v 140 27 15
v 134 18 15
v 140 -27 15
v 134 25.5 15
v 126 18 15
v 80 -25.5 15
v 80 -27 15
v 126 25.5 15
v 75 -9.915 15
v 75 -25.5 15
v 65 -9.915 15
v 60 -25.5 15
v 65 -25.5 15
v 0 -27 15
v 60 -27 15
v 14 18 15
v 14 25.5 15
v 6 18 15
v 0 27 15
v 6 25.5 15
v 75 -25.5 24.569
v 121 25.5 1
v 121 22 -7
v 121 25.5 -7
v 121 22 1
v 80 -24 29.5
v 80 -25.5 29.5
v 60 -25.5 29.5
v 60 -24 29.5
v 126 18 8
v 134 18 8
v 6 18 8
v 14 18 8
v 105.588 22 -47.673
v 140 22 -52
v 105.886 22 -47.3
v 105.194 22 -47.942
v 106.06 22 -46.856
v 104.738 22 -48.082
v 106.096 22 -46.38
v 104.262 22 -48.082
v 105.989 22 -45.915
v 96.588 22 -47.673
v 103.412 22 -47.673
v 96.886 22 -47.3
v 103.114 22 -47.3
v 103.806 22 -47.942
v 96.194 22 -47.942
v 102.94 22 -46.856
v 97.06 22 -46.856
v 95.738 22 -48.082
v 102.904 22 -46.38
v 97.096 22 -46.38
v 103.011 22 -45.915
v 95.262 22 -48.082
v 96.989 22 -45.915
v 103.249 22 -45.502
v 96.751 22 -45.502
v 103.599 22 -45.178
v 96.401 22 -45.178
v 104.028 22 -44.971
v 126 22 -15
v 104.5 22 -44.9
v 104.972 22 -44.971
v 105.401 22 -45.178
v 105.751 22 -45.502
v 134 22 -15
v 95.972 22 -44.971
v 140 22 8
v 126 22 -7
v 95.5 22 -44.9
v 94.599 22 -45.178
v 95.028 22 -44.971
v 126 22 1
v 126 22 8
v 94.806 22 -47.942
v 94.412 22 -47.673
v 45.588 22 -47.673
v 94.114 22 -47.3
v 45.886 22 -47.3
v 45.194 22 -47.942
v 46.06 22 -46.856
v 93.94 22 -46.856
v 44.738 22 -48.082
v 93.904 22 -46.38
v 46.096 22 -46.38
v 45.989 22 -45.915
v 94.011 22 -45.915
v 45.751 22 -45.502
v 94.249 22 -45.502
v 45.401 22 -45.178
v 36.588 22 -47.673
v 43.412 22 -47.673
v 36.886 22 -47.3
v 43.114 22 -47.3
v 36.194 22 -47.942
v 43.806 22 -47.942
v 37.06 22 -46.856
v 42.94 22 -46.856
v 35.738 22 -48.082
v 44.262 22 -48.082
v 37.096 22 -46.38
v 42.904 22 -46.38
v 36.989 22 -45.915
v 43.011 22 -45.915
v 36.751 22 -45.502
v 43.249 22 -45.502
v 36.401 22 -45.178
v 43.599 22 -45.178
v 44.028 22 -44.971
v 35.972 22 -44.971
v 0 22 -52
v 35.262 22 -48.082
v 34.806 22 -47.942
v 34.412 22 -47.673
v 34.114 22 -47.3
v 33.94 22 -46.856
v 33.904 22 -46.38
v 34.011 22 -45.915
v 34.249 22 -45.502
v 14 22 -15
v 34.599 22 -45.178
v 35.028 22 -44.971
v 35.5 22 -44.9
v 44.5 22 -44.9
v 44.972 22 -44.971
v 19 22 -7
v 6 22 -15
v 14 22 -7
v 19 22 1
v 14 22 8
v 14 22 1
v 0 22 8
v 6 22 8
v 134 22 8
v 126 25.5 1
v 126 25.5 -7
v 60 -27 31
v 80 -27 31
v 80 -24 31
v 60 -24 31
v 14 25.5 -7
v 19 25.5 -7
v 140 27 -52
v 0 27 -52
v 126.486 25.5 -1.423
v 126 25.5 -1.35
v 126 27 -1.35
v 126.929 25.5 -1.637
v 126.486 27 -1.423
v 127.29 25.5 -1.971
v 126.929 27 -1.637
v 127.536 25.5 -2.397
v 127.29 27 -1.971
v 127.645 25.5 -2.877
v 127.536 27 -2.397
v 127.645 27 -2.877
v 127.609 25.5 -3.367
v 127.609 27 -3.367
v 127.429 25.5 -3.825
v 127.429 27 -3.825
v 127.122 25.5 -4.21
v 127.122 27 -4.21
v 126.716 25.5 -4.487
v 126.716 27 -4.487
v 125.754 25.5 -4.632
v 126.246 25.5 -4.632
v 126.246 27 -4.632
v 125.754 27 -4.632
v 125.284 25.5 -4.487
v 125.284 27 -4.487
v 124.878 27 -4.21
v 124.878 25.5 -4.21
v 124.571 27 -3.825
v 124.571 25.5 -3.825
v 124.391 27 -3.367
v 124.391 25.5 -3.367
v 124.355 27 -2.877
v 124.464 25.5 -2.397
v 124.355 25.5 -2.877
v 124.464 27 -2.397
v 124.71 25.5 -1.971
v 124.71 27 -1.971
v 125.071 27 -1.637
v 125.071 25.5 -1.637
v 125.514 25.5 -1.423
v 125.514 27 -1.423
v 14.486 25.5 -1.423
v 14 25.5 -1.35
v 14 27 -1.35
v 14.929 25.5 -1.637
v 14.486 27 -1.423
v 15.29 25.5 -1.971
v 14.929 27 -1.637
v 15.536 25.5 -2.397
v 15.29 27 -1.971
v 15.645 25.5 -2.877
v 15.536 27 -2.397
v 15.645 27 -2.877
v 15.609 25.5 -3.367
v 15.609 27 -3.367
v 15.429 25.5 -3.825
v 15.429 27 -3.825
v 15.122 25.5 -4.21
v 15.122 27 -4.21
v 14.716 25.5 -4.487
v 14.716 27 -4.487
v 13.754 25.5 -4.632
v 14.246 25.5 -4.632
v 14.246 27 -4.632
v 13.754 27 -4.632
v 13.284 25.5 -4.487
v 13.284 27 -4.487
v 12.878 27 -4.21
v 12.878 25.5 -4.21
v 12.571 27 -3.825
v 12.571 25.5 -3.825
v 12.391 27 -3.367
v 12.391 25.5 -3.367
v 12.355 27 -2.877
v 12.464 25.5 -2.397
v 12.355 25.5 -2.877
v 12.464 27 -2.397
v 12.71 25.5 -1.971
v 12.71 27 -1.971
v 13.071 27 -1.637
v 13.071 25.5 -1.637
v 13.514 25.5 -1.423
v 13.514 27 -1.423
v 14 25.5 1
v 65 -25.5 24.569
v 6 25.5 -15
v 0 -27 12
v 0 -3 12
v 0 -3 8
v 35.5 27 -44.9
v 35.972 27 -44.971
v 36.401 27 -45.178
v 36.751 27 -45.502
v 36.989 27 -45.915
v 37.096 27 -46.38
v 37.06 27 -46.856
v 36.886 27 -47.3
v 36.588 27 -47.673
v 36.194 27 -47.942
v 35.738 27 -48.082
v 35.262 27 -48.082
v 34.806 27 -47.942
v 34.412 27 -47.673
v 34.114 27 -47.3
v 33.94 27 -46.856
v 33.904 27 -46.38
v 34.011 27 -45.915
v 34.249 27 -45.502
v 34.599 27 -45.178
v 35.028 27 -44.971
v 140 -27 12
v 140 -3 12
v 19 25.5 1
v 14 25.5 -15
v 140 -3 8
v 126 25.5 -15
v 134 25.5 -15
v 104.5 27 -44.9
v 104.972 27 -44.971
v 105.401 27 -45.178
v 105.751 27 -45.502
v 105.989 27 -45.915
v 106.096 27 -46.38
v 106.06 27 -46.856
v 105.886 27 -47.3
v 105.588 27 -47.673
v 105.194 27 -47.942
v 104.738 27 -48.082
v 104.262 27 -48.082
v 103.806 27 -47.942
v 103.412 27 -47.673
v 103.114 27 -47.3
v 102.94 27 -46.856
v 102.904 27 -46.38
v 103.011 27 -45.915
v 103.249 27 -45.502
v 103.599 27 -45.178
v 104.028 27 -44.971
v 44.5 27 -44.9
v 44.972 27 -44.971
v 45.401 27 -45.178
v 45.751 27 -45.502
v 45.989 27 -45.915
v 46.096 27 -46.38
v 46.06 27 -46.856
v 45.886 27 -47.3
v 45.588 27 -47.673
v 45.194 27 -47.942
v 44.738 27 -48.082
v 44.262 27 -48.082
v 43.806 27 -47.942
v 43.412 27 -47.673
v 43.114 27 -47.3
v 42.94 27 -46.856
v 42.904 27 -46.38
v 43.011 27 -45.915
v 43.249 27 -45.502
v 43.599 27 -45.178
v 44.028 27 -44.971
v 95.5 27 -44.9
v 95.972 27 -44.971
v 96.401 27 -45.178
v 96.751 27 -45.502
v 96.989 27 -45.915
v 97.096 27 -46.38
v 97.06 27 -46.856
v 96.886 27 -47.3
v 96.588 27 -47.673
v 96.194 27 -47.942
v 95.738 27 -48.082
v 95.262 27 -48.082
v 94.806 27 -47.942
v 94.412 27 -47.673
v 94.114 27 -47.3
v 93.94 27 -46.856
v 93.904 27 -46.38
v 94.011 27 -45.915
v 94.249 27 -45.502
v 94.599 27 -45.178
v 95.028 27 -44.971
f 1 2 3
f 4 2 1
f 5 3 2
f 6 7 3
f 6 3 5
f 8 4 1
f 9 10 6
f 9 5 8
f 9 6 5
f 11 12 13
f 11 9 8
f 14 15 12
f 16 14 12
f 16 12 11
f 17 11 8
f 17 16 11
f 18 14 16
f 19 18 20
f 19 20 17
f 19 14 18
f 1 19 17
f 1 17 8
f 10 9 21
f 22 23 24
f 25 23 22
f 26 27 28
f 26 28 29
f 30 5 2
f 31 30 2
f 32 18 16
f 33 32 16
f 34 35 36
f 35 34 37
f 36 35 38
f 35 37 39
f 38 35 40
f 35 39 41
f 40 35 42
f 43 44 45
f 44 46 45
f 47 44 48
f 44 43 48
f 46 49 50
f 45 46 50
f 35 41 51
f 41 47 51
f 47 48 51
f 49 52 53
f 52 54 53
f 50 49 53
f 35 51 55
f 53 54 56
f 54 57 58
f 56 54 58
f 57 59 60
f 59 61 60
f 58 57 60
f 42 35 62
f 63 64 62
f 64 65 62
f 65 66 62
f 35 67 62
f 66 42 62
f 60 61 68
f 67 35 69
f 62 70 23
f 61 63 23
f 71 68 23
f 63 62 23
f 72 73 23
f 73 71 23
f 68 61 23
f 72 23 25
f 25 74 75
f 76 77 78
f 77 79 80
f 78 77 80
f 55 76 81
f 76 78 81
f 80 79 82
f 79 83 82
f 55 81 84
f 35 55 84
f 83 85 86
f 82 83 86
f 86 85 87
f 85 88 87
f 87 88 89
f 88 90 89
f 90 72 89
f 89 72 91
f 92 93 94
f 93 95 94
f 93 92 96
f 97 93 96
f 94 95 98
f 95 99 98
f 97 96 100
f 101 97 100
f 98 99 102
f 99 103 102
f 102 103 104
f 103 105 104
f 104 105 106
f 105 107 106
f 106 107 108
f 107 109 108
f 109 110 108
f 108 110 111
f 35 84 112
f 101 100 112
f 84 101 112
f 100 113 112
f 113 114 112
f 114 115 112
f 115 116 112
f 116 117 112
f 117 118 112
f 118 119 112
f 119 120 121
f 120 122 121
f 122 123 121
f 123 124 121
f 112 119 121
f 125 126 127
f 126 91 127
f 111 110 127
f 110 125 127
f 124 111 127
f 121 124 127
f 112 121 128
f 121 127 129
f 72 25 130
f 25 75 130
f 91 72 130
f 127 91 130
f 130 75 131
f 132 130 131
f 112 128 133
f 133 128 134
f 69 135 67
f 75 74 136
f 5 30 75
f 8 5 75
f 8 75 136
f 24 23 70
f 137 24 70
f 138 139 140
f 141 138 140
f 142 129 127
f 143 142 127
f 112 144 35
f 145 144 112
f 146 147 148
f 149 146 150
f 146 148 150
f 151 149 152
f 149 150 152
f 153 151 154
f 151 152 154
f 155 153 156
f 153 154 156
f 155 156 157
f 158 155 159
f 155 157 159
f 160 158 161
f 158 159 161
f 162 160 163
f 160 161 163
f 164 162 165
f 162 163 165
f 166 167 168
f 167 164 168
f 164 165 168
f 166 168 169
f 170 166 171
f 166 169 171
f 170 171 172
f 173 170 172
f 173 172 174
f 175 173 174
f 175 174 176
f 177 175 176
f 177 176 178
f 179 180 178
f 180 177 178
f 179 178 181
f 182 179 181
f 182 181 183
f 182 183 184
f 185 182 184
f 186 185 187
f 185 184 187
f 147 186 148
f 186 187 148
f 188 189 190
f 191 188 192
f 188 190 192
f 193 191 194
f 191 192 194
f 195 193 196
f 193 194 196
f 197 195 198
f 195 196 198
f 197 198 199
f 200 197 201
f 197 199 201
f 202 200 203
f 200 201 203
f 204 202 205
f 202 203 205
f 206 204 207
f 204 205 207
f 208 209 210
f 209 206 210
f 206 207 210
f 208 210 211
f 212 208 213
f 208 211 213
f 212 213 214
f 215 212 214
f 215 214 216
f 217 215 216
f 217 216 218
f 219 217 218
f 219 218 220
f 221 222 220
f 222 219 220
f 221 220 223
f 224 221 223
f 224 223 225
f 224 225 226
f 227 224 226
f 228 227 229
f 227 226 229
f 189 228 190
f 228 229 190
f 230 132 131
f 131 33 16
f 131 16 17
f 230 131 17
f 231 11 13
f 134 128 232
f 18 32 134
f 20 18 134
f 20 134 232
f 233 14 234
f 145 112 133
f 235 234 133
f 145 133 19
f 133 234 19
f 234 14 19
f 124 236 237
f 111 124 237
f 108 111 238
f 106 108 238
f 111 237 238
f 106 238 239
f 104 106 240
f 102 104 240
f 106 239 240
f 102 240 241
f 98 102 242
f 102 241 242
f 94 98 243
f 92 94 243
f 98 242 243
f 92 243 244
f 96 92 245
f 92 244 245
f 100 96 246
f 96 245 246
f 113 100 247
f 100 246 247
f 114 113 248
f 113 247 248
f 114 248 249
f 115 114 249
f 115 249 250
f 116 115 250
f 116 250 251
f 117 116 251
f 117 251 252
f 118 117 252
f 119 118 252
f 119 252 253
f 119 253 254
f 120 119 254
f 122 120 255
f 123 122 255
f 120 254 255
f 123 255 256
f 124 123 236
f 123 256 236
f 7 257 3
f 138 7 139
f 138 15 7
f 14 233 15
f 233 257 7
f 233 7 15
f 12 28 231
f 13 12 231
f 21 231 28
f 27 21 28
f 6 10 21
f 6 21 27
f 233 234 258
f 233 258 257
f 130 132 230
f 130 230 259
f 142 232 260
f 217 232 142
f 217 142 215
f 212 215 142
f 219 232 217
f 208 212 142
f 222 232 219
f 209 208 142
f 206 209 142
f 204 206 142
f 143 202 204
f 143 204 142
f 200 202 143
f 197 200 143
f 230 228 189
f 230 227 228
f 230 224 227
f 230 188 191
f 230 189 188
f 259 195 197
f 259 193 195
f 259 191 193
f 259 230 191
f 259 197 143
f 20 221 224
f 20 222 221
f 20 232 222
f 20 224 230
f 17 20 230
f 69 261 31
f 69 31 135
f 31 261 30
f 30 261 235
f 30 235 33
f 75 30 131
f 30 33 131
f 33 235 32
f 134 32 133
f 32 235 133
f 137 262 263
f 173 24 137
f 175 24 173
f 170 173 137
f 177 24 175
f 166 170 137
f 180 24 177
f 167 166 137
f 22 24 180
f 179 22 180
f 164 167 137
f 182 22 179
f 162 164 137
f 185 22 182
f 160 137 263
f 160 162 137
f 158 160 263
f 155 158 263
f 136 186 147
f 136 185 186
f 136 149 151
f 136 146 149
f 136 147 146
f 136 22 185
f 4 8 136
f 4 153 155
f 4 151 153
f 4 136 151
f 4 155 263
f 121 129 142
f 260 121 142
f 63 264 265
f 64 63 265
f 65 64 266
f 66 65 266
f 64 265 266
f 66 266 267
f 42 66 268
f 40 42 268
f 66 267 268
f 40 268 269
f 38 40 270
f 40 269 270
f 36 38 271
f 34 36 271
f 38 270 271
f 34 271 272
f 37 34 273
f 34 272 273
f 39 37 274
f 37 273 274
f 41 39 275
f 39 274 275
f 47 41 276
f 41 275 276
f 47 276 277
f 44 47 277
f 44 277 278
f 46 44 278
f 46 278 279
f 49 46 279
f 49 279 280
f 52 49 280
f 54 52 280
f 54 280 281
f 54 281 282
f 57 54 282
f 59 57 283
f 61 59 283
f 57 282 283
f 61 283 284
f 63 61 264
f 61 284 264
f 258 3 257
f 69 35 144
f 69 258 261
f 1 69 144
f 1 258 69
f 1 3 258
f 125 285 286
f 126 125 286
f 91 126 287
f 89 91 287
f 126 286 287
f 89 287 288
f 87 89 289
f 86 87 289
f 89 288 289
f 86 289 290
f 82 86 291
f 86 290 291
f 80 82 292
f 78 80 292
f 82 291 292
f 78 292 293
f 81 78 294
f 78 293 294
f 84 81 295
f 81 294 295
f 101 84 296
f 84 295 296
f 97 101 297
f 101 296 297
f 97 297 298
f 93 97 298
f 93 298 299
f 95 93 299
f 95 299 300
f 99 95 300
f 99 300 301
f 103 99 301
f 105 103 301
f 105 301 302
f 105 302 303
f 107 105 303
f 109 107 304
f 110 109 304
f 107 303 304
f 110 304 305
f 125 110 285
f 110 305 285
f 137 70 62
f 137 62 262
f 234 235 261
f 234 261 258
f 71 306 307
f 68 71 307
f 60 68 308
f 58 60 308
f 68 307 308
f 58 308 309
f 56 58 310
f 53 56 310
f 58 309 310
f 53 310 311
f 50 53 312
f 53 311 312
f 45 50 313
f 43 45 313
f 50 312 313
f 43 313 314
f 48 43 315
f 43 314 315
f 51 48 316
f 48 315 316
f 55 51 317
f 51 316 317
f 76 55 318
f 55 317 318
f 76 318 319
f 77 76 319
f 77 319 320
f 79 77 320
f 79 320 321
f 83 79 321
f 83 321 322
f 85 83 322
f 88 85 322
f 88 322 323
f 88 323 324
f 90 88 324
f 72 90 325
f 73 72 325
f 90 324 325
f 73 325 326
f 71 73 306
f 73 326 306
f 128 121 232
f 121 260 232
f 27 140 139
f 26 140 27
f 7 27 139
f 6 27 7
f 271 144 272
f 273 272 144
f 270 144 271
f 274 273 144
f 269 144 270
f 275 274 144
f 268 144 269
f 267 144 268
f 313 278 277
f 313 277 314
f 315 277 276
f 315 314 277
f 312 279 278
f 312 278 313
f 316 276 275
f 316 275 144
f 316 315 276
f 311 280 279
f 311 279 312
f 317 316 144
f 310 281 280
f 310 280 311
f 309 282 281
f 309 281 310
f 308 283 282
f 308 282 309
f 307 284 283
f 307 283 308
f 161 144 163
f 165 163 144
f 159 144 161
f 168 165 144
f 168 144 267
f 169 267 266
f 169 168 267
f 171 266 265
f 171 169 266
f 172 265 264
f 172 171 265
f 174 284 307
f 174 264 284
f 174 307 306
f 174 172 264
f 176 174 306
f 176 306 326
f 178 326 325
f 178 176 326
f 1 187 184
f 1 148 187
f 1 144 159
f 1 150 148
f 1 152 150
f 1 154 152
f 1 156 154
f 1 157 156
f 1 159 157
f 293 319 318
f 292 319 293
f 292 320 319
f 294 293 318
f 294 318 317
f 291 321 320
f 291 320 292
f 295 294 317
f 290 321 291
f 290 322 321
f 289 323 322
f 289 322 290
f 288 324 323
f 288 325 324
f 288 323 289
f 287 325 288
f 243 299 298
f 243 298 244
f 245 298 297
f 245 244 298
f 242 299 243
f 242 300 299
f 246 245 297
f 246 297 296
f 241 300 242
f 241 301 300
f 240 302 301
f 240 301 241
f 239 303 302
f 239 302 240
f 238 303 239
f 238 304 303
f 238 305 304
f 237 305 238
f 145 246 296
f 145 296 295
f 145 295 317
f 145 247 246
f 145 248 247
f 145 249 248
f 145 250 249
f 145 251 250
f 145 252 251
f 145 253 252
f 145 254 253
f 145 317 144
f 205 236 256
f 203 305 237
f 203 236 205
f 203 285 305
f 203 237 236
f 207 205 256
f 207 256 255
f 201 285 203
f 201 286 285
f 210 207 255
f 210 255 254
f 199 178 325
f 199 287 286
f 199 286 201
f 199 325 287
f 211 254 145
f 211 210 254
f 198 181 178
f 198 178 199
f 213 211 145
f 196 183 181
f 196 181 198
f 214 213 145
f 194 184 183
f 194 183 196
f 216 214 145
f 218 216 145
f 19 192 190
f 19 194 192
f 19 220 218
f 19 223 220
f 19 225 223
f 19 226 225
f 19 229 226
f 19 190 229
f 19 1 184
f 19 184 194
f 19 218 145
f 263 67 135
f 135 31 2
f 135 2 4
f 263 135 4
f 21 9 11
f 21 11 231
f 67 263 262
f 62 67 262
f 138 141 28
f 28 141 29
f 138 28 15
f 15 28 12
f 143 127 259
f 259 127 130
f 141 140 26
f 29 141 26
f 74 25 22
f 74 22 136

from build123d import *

# Parameters (mm, degrees)
EXTRUDE_1_DEPTH     = 140
SKETCH_2_R          = 1.65
CUT_EXTRUDE_1_DEPTH = 5
SKETCH_3_W          = 8
SKETCH_3_H          = 7.5
CUT_EXTRUDE_2_DEPTH = 146.701750161
SKETCH_4_W          = 10
SKETCH_4_H          = 8
CUT_EXTRUDE_3_DEPTH = 3.5
SKETCH_5_W          = 20
SKETCH_5_H          = 1.5
EXTRUDE_2_DEPTH     = 16
SKETCH_6_W          = 1.5
SKETCH_6_H          = 1.5
EXTRUDE_3_DEPTH     = 20
RIB_1_REACH         = 83.179
SKETCH_8_WALL_W     = 182.645829166
SKETCH_8_WALL_H     = 10
SKETCH_9_W          = 140
SKETCH_9_H          = 5
EXTRUDE_4_DEPTH     = 37
SKETCH_10_R         = 1.6
CUT_EXTRUDE_4_DEPTH = 5


with BuildPart() as part:
    # 草图1 → 凸台-拉伸1 (new body)
    with BuildSketch(Plane(origin=(0, 0, 0), x_dir=(0, 0, -1), z_dir=(1, 0, 0))):
        Polygon((-15, 27), (15, 27), (15, 22), (-8, 22), (-8, 17), (-8, -3), (-12, -3), (-12, -27), (-15, -27), align=None)
    extrude(amount=EXTRUDE_1_DEPTH)

    # 草图2 → 切除-拉伸1 (cut)
    with BuildSketch(Plane(origin=(0, 27, 0), x_dir=(1, 0, 0), z_dir=(0, 1, 0))):
        with Locations(Location((14, 3, 0), (0, 0, 270))):
            Circle(SKETCH_2_R)
        with Locations(Location((126, 3, 0), (0, 0, 270))):
            Circle(SKETCH_2_R)
    extrude(amount=-CUT_EXTRUDE_1_DEPTH, mode=Mode.SUBTRACT)

    # 草图3 → 切除-拉伸2 (cut, through all)
    with BuildSketch(Plane.XY.offset(15)):
        with Locations((10, 21.75)):
            Rectangle(SKETCH_3_W, SKETCH_3_H)
        with Locations((130, 21.75)):
            Rectangle(SKETCH_3_W, SKETCH_3_H)
    extrude(amount=-CUT_EXTRUDE_2_DEPTH, mode=Mode.SUBTRACT)

    # 草图4 → 切除-拉伸3 (cut)
    with BuildSketch(Plane.XZ.offset(-22)):
        with Locations((14, -3)):
            Rectangle(SKETCH_4_W, SKETCH_4_H)
        with Locations((126, -3)):
            Rectangle(SKETCH_4_W, SKETCH_4_H)
    extrude(amount=-CUT_EXTRUDE_3_DEPTH, mode=Mode.SUBTRACT)

    # 草图5 → 凸台-拉伸2 (add)
    with BuildSketch(Plane.XY.offset(15)):
        with Locations((70, -26.25)):
            Rectangle(SKETCH_5_W, SKETCH_5_H)
    extrude(amount=EXTRUDE_2_DEPTH)

    # 草图6 → 凸台-拉伸3 (add)
    with BuildSketch(Plane(origin=(80, 0, 0), x_dir=(0, 0, -1), z_dir=(1, 0, 0))):
        with Locations((-30.25, -24.75)):
            Rectangle(SKETCH_6_W, SKETCH_6_H)
    extrude(amount=-EXTRUDE_3_DEPTH)

    # 草图8 wall → 筋1 (add, up to next)
    with BuildSketch(Plane(origin=(70, -17.707455467, 19.784433865), x_dir=(0, -0.852193749384, 0.523226350168), z_dir=(0, 0.523226350168, 0.852193749384)), mode=Mode.PRIVATE) as rib_1_sk1:
        Rectangle(SKETCH_8_WALL_W, SKETCH_8_WALL_H)
    rib_1_tool1 = extrude(rib_1_sk1.sketch, amount=-RIB_1_REACH, mode=Mode.PRIVATE) - part.part
    add(rib_1_tool1.solids().sort_by_distance((70, -17.707455467, 19.784433865))[0])

    # 草图9 → 凸台-拉伸4 (add)
    with BuildSketch(Plane(origin=(0, 0, -15), x_dir=(-1, 0, 0), z_dir=(0, 0, -1))):
        with Locations((-70, 24.5)):
            Rectangle(SKETCH_9_W, SKETCH_9_H)
    extrude(amount=EXTRUDE_4_DEPTH)

    # 草图10 → 切除-拉伸4 (cut)
    with BuildSketch(Plane(origin=(0, 27, 0), x_dir=(1, 0, 0), z_dir=(0, 1, 0))):
        with Locations(Location((35.5, 46.5, 0), (0, 0, 270))):
            Circle(SKETCH_10_R)
        with Locations(Location((44.5, 46.5, 0), (0, 0, 270))):
            Circle(SKETCH_10_R)
        with Locations(Location((95.5, 46.5, 0), (0, 0, 270))):
            Circle(SKETCH_10_R)
        with Locations(Location((104.5, 46.5, 0), (0, 0, 270))):
            Circle(SKETCH_10_R)
    extrude(amount=-CUT_EXTRUDE_4_DEPTH, mode=Mode.SUBTRACT)


solid = part.part
